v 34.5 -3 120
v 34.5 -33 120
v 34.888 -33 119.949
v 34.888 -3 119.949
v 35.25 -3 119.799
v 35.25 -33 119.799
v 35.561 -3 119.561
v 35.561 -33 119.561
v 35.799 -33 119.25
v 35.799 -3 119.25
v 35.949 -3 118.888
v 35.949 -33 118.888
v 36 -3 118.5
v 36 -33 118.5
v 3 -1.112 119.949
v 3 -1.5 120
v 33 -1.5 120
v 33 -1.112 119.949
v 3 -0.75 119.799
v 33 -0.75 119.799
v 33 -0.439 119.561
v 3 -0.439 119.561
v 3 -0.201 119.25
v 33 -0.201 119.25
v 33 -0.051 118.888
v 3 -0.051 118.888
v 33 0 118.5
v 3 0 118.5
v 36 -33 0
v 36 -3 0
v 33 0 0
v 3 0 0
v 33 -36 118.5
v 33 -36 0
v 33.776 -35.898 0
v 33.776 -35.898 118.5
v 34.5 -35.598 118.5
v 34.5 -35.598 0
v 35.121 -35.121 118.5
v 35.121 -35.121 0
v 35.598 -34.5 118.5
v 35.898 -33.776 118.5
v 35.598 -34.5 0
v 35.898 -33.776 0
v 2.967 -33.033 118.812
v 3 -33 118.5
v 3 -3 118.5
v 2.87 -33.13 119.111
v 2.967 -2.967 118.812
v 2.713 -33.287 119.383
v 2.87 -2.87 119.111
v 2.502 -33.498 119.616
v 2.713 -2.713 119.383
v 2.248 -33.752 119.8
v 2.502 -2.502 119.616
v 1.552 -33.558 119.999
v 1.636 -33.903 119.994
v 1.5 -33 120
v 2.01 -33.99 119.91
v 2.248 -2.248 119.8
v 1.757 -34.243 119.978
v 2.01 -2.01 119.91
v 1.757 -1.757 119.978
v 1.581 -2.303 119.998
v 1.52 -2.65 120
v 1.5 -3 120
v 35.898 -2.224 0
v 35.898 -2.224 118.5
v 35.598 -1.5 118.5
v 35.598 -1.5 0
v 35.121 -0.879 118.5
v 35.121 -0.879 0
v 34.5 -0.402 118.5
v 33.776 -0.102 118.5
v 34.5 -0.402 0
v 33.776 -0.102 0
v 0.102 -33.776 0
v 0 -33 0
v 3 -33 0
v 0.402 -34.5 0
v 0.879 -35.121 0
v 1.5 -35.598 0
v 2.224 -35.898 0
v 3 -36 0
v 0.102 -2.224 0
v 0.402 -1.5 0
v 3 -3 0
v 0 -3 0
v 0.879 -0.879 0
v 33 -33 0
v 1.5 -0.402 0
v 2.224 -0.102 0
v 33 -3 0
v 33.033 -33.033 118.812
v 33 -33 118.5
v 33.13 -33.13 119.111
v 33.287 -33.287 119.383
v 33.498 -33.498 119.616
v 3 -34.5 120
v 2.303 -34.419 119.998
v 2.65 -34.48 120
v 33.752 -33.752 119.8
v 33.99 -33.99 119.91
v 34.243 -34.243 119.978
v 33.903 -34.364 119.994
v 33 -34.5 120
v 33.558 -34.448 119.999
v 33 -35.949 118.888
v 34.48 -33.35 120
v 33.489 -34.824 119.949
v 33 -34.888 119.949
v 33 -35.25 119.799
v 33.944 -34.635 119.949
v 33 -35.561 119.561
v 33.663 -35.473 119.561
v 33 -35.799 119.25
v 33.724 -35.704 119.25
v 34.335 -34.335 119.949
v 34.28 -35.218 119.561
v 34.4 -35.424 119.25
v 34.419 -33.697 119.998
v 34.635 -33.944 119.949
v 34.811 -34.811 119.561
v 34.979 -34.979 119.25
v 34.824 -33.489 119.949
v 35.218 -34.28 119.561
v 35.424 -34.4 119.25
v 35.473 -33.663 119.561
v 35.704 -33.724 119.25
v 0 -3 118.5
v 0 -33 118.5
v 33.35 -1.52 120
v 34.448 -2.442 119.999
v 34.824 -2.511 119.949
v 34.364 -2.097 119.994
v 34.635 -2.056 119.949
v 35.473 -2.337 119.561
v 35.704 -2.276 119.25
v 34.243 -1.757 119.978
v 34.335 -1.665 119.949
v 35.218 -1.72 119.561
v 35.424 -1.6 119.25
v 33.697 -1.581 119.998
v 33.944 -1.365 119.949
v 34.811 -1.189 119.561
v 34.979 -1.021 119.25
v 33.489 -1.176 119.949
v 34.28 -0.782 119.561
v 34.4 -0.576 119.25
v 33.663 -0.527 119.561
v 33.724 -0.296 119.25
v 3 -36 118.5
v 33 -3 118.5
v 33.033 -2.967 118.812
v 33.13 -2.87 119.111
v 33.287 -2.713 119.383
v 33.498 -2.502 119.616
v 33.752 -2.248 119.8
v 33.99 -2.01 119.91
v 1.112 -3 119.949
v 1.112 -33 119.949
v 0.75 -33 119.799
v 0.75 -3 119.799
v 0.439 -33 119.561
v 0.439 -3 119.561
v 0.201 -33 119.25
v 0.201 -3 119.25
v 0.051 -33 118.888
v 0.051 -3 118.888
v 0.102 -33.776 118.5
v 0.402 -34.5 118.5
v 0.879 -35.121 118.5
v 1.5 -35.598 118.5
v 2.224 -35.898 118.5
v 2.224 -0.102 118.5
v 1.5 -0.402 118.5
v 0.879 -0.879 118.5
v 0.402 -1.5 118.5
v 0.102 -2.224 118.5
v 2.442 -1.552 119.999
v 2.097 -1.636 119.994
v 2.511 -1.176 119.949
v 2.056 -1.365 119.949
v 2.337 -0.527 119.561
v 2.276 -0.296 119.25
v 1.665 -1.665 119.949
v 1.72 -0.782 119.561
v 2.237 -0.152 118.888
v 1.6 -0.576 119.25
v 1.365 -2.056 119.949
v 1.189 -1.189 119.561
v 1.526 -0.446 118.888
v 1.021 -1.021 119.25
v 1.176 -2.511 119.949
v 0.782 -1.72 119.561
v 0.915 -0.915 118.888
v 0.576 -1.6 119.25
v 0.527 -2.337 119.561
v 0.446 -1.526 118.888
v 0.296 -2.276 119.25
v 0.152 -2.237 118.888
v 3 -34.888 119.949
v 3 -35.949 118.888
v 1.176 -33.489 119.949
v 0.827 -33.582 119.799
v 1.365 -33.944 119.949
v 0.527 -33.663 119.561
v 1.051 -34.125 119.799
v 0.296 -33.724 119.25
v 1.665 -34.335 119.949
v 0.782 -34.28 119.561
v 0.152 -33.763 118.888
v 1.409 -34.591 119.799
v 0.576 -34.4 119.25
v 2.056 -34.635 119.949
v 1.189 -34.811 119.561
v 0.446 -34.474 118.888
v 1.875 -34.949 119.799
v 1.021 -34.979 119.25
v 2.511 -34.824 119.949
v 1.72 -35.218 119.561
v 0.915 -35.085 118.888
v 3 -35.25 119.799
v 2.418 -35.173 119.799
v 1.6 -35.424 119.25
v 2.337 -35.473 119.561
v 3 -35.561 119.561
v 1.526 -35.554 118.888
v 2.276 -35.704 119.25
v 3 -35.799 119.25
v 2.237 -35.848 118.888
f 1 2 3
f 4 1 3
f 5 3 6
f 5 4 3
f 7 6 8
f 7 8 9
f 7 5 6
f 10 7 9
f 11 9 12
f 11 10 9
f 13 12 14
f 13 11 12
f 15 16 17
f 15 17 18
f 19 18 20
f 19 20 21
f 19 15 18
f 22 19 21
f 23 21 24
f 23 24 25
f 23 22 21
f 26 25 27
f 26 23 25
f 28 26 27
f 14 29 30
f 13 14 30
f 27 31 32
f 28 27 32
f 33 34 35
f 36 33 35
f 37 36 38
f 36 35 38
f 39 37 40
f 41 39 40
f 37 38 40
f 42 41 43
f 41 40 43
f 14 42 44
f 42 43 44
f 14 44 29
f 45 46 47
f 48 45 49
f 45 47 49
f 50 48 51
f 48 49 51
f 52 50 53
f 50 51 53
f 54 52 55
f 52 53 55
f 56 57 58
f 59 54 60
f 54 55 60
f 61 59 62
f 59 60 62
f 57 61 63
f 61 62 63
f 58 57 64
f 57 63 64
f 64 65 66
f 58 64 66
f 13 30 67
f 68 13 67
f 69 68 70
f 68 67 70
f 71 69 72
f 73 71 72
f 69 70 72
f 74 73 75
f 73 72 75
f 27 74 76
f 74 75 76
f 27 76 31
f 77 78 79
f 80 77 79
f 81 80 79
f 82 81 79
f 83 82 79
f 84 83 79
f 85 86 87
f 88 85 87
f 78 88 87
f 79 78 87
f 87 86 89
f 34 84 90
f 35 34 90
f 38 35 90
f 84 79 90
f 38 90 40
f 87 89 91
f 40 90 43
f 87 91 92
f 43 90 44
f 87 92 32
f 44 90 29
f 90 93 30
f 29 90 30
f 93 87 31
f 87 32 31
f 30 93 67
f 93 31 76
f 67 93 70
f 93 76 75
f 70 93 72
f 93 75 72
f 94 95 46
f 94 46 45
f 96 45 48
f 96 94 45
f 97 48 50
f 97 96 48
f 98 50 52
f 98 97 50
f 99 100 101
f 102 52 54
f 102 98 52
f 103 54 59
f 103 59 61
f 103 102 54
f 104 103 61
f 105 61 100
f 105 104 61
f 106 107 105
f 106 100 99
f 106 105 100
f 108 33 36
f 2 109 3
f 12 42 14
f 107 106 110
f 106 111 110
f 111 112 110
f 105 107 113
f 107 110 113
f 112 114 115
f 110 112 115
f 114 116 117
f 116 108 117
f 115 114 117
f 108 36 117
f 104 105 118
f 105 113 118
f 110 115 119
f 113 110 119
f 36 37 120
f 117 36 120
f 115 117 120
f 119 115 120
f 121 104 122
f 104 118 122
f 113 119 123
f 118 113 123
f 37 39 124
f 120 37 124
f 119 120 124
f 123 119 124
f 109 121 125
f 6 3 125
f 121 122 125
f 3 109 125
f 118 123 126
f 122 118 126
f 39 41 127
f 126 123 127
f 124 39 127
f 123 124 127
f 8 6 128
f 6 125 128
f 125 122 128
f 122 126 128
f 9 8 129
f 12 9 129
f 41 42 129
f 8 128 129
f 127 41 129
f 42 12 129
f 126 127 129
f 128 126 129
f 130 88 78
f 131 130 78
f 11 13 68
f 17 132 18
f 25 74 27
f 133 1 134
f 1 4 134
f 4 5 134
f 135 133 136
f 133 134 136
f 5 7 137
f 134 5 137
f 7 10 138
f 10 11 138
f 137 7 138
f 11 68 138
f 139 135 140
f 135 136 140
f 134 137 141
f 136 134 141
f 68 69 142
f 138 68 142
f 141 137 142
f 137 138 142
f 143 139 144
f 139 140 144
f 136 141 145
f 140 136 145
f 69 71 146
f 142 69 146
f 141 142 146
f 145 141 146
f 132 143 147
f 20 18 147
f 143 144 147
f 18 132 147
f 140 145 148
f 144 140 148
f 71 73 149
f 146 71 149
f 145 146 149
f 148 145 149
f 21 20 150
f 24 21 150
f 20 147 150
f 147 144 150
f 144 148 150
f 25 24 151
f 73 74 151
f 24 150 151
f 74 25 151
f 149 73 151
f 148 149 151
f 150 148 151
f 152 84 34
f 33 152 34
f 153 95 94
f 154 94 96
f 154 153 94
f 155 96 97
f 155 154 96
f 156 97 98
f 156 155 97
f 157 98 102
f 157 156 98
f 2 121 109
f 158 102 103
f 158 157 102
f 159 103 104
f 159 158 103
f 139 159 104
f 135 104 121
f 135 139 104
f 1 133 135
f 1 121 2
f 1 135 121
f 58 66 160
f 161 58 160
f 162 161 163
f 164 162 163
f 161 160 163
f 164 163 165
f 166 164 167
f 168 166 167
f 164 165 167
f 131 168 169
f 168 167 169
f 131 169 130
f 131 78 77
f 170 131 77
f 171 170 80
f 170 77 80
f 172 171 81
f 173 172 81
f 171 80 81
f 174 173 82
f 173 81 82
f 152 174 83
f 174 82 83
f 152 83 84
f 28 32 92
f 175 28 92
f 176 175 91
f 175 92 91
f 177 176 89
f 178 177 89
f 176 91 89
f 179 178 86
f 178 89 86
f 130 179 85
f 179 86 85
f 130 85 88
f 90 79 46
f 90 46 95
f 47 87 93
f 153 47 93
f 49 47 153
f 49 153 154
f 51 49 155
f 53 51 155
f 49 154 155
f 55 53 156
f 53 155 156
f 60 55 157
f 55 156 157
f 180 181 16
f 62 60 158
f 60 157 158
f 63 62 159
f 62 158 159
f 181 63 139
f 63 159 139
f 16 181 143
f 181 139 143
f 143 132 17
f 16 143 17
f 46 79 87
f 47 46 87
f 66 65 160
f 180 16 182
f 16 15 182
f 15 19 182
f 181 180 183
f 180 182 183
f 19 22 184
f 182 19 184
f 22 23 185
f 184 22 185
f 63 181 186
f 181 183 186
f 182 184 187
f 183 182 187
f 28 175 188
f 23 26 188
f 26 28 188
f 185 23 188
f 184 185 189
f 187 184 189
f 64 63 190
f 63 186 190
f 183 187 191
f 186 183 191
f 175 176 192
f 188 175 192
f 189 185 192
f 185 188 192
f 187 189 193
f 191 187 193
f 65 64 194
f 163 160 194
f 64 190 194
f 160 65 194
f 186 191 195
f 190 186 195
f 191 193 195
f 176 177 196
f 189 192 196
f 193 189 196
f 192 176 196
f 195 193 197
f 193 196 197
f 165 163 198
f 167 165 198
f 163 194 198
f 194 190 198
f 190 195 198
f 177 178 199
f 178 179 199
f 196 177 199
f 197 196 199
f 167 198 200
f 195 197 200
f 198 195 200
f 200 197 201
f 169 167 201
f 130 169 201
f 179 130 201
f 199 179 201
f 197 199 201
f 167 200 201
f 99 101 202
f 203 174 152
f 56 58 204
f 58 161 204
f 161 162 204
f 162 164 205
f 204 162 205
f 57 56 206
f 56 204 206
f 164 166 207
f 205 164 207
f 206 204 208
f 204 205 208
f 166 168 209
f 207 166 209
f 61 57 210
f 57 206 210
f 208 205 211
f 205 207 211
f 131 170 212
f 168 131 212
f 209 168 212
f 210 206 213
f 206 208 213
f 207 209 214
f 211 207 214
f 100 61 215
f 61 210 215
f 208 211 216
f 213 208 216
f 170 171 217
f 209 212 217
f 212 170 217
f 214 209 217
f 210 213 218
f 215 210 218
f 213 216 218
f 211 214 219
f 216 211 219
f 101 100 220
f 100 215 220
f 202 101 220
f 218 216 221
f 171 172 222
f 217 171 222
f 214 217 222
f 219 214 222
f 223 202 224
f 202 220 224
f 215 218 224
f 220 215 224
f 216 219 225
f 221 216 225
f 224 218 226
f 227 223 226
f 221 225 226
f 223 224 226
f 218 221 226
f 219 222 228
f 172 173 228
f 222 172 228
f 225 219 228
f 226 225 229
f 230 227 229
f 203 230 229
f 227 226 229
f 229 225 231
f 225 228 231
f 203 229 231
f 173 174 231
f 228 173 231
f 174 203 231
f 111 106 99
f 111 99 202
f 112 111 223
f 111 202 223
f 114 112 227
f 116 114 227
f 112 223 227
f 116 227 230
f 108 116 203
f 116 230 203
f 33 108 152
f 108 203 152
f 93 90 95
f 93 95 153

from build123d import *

# Parameters (mm, degrees)
F0_W         = 30
F0_H         = 30
F1_DEPTH     = 120
F2_R         = 1.5
F3_T1_DEPTH  = 30
F3_T3_DEPTH  = 30
F3_T6_ANGLE  = 90
F3_T8_ANGLE  = 90
F3_T10_ANGLE = 90
F3_T12_ANGLE = 90


# Not quite as in the source:
# - a fillet or chamfer that OpenCascade refuses, or shapes differently, is made with other operations: its cross-section is extruded or revolved along the edge and cut away or added


with BuildPart() as f1:
    # F0 (on Top) → F1 (new body)
    with BuildSketch(Plane.XY):
        with BuildLine():
            Line((33, 0), (3, 0))
            ThreePointArc((3, 0), (0.8786796564, -0.8786796564), (0, -3))
            Line((0, -3), (0, -33))
            ThreePointArc((0, -33), (0.8786796564, -35.1213203436), (3, -36))
            Line((3, -36), (33, -36))
            ThreePointArc((33, -36), (35.1213203436, -35.1213203436), (36, -33))
            Line((36, -33), (36, -3))
            ThreePointArc((36, -3), (35.1213203436, -0.8786796564), (33, 0))
        make_face()
        with Locations((18, -18)):
            Rectangle(F0_W, F0_H, mode=Mode.SUBTRACT)
    extrude(amount=F1_DEPTH)

    # F2
    f2_edges = [f1.edges().sort_by_distance(p)[0] for p in [
        (18, -33, 120),
        (3, -18, 120),
        (18, -3, 120),
        (33, -18, 120),
    ]]
    fillet(f2_edges, radius=F2_R)

    # F3: fillet of radius 1.5 on 4 edges, made by hand

    # F3_s2 → F3_t1 (cut)
    with BuildSketch(Plane.XZ.offset(3)):
        with BuildLine():
            ThreePointArc((34.5, 120), (35.5606601718, 119.5606601718), (36, 118.5))
            Line((36, 118.5), (36, 120))
            Line((36, 120), (34.5, 120))
        make_face()
        with BuildLine():
            ThreePointArc((1.5, 120), (0.4393398282, 119.5606601718), (0, 118.5))
            Line((0, 118.5), (0, 120))
            Line((0, 120), (1.5, 120))
        make_face()
    extrude(amount=F3_T1_DEPTH, mode=Mode.SUBTRACT)

    # F3_s4 → F3_t3 (cut)
    with BuildSketch(Plane.YZ.offset(3)):
        with BuildLine():
            ThreePointArc((-1.5, 120), (-0.4393398282, 119.5606601718), (0, 118.5))
            Line((0, 118.5), (0, 120))
            Line((0, 120), (-1.5, 120))
        make_face()
        with BuildLine():
            ThreePointArc((-34.5, 120), (-35.5606601718, 119.5606601718), (-36, 118.5))
            Line((-36, 118.5), (-36, 120))
            Line((-36, 120), (-34.5, 120))
        make_face()
    extrude(amount=F3_T3_DEPTH, mode=Mode.SUBTRACT)

    # F3_s5 → F3_t6 (revolve, cut)
    with BuildSketch(Plane.XZ.offset(3)):
        with BuildLine():
            ThreePointArc((34.5, 120), (35.5606601718, 119.5606601718), (36, 118.5))
            Line((36, 118.5), (36, 120))
            Line((36, 120), (34.5, 120))
        make_face()
    revolve(axis=Axis((33, -3, 120), (0, 0, 1)), revolution_arc=F3_T6_ANGLE, mode=Mode.SUBTRACT)

    # F3_s7 → F3_t8 (revolve, cut)
    with BuildSketch(Plane.YZ.offset(3)):
        with BuildLine():
            ThreePointArc((-1.5, 120), (-0.4393398282, 119.5606601718), (0, 118.5))
            Line((0, 118.5), (0, 120))
            Line((0, 120), (-1.5, 120))
        make_face()
    revolve(axis=Axis((3, -3, 120), (0, 0, 1)), revolution_arc=F3_T8_ANGLE, mode=Mode.SUBTRACT)

    # F3_s9 → F3_t10 (revolve, cut)
    with BuildSketch(Plane.XZ.offset(33)):
        with BuildLine():
            ThreePointArc((1.5, 120), (0.4393398282, 119.5606601718), (0, 118.5))
            Line((0, 118.5), (0, 120))
            Line((0, 120), (1.5, 120))
        make_face()
    revolve(axis=Axis((3, -33, 120), (0, 0, 1)), revolution_arc=F3_T10_ANGLE, mode=Mode.SUBTRACT)

    # F3_s11 → F3_t12 (revolve, cut)
    with BuildSketch(Plane.YZ.offset(33)):
        with BuildLine():
            ThreePointArc((-34.5, 120), (-35.5606601718, 119.5606601718), (-36, 118.5))
            Line((-36, 118.5), (-36, 120))
            Line((-36, 120), (-34.5, 120))
        make_face()
    revolve(axis=Axis((33, -33, 120), (0, 0, 1)), revolution_arc=F3_T12_ANGLE, mode=Mode.SUBTRACT)


solid = f1.part
